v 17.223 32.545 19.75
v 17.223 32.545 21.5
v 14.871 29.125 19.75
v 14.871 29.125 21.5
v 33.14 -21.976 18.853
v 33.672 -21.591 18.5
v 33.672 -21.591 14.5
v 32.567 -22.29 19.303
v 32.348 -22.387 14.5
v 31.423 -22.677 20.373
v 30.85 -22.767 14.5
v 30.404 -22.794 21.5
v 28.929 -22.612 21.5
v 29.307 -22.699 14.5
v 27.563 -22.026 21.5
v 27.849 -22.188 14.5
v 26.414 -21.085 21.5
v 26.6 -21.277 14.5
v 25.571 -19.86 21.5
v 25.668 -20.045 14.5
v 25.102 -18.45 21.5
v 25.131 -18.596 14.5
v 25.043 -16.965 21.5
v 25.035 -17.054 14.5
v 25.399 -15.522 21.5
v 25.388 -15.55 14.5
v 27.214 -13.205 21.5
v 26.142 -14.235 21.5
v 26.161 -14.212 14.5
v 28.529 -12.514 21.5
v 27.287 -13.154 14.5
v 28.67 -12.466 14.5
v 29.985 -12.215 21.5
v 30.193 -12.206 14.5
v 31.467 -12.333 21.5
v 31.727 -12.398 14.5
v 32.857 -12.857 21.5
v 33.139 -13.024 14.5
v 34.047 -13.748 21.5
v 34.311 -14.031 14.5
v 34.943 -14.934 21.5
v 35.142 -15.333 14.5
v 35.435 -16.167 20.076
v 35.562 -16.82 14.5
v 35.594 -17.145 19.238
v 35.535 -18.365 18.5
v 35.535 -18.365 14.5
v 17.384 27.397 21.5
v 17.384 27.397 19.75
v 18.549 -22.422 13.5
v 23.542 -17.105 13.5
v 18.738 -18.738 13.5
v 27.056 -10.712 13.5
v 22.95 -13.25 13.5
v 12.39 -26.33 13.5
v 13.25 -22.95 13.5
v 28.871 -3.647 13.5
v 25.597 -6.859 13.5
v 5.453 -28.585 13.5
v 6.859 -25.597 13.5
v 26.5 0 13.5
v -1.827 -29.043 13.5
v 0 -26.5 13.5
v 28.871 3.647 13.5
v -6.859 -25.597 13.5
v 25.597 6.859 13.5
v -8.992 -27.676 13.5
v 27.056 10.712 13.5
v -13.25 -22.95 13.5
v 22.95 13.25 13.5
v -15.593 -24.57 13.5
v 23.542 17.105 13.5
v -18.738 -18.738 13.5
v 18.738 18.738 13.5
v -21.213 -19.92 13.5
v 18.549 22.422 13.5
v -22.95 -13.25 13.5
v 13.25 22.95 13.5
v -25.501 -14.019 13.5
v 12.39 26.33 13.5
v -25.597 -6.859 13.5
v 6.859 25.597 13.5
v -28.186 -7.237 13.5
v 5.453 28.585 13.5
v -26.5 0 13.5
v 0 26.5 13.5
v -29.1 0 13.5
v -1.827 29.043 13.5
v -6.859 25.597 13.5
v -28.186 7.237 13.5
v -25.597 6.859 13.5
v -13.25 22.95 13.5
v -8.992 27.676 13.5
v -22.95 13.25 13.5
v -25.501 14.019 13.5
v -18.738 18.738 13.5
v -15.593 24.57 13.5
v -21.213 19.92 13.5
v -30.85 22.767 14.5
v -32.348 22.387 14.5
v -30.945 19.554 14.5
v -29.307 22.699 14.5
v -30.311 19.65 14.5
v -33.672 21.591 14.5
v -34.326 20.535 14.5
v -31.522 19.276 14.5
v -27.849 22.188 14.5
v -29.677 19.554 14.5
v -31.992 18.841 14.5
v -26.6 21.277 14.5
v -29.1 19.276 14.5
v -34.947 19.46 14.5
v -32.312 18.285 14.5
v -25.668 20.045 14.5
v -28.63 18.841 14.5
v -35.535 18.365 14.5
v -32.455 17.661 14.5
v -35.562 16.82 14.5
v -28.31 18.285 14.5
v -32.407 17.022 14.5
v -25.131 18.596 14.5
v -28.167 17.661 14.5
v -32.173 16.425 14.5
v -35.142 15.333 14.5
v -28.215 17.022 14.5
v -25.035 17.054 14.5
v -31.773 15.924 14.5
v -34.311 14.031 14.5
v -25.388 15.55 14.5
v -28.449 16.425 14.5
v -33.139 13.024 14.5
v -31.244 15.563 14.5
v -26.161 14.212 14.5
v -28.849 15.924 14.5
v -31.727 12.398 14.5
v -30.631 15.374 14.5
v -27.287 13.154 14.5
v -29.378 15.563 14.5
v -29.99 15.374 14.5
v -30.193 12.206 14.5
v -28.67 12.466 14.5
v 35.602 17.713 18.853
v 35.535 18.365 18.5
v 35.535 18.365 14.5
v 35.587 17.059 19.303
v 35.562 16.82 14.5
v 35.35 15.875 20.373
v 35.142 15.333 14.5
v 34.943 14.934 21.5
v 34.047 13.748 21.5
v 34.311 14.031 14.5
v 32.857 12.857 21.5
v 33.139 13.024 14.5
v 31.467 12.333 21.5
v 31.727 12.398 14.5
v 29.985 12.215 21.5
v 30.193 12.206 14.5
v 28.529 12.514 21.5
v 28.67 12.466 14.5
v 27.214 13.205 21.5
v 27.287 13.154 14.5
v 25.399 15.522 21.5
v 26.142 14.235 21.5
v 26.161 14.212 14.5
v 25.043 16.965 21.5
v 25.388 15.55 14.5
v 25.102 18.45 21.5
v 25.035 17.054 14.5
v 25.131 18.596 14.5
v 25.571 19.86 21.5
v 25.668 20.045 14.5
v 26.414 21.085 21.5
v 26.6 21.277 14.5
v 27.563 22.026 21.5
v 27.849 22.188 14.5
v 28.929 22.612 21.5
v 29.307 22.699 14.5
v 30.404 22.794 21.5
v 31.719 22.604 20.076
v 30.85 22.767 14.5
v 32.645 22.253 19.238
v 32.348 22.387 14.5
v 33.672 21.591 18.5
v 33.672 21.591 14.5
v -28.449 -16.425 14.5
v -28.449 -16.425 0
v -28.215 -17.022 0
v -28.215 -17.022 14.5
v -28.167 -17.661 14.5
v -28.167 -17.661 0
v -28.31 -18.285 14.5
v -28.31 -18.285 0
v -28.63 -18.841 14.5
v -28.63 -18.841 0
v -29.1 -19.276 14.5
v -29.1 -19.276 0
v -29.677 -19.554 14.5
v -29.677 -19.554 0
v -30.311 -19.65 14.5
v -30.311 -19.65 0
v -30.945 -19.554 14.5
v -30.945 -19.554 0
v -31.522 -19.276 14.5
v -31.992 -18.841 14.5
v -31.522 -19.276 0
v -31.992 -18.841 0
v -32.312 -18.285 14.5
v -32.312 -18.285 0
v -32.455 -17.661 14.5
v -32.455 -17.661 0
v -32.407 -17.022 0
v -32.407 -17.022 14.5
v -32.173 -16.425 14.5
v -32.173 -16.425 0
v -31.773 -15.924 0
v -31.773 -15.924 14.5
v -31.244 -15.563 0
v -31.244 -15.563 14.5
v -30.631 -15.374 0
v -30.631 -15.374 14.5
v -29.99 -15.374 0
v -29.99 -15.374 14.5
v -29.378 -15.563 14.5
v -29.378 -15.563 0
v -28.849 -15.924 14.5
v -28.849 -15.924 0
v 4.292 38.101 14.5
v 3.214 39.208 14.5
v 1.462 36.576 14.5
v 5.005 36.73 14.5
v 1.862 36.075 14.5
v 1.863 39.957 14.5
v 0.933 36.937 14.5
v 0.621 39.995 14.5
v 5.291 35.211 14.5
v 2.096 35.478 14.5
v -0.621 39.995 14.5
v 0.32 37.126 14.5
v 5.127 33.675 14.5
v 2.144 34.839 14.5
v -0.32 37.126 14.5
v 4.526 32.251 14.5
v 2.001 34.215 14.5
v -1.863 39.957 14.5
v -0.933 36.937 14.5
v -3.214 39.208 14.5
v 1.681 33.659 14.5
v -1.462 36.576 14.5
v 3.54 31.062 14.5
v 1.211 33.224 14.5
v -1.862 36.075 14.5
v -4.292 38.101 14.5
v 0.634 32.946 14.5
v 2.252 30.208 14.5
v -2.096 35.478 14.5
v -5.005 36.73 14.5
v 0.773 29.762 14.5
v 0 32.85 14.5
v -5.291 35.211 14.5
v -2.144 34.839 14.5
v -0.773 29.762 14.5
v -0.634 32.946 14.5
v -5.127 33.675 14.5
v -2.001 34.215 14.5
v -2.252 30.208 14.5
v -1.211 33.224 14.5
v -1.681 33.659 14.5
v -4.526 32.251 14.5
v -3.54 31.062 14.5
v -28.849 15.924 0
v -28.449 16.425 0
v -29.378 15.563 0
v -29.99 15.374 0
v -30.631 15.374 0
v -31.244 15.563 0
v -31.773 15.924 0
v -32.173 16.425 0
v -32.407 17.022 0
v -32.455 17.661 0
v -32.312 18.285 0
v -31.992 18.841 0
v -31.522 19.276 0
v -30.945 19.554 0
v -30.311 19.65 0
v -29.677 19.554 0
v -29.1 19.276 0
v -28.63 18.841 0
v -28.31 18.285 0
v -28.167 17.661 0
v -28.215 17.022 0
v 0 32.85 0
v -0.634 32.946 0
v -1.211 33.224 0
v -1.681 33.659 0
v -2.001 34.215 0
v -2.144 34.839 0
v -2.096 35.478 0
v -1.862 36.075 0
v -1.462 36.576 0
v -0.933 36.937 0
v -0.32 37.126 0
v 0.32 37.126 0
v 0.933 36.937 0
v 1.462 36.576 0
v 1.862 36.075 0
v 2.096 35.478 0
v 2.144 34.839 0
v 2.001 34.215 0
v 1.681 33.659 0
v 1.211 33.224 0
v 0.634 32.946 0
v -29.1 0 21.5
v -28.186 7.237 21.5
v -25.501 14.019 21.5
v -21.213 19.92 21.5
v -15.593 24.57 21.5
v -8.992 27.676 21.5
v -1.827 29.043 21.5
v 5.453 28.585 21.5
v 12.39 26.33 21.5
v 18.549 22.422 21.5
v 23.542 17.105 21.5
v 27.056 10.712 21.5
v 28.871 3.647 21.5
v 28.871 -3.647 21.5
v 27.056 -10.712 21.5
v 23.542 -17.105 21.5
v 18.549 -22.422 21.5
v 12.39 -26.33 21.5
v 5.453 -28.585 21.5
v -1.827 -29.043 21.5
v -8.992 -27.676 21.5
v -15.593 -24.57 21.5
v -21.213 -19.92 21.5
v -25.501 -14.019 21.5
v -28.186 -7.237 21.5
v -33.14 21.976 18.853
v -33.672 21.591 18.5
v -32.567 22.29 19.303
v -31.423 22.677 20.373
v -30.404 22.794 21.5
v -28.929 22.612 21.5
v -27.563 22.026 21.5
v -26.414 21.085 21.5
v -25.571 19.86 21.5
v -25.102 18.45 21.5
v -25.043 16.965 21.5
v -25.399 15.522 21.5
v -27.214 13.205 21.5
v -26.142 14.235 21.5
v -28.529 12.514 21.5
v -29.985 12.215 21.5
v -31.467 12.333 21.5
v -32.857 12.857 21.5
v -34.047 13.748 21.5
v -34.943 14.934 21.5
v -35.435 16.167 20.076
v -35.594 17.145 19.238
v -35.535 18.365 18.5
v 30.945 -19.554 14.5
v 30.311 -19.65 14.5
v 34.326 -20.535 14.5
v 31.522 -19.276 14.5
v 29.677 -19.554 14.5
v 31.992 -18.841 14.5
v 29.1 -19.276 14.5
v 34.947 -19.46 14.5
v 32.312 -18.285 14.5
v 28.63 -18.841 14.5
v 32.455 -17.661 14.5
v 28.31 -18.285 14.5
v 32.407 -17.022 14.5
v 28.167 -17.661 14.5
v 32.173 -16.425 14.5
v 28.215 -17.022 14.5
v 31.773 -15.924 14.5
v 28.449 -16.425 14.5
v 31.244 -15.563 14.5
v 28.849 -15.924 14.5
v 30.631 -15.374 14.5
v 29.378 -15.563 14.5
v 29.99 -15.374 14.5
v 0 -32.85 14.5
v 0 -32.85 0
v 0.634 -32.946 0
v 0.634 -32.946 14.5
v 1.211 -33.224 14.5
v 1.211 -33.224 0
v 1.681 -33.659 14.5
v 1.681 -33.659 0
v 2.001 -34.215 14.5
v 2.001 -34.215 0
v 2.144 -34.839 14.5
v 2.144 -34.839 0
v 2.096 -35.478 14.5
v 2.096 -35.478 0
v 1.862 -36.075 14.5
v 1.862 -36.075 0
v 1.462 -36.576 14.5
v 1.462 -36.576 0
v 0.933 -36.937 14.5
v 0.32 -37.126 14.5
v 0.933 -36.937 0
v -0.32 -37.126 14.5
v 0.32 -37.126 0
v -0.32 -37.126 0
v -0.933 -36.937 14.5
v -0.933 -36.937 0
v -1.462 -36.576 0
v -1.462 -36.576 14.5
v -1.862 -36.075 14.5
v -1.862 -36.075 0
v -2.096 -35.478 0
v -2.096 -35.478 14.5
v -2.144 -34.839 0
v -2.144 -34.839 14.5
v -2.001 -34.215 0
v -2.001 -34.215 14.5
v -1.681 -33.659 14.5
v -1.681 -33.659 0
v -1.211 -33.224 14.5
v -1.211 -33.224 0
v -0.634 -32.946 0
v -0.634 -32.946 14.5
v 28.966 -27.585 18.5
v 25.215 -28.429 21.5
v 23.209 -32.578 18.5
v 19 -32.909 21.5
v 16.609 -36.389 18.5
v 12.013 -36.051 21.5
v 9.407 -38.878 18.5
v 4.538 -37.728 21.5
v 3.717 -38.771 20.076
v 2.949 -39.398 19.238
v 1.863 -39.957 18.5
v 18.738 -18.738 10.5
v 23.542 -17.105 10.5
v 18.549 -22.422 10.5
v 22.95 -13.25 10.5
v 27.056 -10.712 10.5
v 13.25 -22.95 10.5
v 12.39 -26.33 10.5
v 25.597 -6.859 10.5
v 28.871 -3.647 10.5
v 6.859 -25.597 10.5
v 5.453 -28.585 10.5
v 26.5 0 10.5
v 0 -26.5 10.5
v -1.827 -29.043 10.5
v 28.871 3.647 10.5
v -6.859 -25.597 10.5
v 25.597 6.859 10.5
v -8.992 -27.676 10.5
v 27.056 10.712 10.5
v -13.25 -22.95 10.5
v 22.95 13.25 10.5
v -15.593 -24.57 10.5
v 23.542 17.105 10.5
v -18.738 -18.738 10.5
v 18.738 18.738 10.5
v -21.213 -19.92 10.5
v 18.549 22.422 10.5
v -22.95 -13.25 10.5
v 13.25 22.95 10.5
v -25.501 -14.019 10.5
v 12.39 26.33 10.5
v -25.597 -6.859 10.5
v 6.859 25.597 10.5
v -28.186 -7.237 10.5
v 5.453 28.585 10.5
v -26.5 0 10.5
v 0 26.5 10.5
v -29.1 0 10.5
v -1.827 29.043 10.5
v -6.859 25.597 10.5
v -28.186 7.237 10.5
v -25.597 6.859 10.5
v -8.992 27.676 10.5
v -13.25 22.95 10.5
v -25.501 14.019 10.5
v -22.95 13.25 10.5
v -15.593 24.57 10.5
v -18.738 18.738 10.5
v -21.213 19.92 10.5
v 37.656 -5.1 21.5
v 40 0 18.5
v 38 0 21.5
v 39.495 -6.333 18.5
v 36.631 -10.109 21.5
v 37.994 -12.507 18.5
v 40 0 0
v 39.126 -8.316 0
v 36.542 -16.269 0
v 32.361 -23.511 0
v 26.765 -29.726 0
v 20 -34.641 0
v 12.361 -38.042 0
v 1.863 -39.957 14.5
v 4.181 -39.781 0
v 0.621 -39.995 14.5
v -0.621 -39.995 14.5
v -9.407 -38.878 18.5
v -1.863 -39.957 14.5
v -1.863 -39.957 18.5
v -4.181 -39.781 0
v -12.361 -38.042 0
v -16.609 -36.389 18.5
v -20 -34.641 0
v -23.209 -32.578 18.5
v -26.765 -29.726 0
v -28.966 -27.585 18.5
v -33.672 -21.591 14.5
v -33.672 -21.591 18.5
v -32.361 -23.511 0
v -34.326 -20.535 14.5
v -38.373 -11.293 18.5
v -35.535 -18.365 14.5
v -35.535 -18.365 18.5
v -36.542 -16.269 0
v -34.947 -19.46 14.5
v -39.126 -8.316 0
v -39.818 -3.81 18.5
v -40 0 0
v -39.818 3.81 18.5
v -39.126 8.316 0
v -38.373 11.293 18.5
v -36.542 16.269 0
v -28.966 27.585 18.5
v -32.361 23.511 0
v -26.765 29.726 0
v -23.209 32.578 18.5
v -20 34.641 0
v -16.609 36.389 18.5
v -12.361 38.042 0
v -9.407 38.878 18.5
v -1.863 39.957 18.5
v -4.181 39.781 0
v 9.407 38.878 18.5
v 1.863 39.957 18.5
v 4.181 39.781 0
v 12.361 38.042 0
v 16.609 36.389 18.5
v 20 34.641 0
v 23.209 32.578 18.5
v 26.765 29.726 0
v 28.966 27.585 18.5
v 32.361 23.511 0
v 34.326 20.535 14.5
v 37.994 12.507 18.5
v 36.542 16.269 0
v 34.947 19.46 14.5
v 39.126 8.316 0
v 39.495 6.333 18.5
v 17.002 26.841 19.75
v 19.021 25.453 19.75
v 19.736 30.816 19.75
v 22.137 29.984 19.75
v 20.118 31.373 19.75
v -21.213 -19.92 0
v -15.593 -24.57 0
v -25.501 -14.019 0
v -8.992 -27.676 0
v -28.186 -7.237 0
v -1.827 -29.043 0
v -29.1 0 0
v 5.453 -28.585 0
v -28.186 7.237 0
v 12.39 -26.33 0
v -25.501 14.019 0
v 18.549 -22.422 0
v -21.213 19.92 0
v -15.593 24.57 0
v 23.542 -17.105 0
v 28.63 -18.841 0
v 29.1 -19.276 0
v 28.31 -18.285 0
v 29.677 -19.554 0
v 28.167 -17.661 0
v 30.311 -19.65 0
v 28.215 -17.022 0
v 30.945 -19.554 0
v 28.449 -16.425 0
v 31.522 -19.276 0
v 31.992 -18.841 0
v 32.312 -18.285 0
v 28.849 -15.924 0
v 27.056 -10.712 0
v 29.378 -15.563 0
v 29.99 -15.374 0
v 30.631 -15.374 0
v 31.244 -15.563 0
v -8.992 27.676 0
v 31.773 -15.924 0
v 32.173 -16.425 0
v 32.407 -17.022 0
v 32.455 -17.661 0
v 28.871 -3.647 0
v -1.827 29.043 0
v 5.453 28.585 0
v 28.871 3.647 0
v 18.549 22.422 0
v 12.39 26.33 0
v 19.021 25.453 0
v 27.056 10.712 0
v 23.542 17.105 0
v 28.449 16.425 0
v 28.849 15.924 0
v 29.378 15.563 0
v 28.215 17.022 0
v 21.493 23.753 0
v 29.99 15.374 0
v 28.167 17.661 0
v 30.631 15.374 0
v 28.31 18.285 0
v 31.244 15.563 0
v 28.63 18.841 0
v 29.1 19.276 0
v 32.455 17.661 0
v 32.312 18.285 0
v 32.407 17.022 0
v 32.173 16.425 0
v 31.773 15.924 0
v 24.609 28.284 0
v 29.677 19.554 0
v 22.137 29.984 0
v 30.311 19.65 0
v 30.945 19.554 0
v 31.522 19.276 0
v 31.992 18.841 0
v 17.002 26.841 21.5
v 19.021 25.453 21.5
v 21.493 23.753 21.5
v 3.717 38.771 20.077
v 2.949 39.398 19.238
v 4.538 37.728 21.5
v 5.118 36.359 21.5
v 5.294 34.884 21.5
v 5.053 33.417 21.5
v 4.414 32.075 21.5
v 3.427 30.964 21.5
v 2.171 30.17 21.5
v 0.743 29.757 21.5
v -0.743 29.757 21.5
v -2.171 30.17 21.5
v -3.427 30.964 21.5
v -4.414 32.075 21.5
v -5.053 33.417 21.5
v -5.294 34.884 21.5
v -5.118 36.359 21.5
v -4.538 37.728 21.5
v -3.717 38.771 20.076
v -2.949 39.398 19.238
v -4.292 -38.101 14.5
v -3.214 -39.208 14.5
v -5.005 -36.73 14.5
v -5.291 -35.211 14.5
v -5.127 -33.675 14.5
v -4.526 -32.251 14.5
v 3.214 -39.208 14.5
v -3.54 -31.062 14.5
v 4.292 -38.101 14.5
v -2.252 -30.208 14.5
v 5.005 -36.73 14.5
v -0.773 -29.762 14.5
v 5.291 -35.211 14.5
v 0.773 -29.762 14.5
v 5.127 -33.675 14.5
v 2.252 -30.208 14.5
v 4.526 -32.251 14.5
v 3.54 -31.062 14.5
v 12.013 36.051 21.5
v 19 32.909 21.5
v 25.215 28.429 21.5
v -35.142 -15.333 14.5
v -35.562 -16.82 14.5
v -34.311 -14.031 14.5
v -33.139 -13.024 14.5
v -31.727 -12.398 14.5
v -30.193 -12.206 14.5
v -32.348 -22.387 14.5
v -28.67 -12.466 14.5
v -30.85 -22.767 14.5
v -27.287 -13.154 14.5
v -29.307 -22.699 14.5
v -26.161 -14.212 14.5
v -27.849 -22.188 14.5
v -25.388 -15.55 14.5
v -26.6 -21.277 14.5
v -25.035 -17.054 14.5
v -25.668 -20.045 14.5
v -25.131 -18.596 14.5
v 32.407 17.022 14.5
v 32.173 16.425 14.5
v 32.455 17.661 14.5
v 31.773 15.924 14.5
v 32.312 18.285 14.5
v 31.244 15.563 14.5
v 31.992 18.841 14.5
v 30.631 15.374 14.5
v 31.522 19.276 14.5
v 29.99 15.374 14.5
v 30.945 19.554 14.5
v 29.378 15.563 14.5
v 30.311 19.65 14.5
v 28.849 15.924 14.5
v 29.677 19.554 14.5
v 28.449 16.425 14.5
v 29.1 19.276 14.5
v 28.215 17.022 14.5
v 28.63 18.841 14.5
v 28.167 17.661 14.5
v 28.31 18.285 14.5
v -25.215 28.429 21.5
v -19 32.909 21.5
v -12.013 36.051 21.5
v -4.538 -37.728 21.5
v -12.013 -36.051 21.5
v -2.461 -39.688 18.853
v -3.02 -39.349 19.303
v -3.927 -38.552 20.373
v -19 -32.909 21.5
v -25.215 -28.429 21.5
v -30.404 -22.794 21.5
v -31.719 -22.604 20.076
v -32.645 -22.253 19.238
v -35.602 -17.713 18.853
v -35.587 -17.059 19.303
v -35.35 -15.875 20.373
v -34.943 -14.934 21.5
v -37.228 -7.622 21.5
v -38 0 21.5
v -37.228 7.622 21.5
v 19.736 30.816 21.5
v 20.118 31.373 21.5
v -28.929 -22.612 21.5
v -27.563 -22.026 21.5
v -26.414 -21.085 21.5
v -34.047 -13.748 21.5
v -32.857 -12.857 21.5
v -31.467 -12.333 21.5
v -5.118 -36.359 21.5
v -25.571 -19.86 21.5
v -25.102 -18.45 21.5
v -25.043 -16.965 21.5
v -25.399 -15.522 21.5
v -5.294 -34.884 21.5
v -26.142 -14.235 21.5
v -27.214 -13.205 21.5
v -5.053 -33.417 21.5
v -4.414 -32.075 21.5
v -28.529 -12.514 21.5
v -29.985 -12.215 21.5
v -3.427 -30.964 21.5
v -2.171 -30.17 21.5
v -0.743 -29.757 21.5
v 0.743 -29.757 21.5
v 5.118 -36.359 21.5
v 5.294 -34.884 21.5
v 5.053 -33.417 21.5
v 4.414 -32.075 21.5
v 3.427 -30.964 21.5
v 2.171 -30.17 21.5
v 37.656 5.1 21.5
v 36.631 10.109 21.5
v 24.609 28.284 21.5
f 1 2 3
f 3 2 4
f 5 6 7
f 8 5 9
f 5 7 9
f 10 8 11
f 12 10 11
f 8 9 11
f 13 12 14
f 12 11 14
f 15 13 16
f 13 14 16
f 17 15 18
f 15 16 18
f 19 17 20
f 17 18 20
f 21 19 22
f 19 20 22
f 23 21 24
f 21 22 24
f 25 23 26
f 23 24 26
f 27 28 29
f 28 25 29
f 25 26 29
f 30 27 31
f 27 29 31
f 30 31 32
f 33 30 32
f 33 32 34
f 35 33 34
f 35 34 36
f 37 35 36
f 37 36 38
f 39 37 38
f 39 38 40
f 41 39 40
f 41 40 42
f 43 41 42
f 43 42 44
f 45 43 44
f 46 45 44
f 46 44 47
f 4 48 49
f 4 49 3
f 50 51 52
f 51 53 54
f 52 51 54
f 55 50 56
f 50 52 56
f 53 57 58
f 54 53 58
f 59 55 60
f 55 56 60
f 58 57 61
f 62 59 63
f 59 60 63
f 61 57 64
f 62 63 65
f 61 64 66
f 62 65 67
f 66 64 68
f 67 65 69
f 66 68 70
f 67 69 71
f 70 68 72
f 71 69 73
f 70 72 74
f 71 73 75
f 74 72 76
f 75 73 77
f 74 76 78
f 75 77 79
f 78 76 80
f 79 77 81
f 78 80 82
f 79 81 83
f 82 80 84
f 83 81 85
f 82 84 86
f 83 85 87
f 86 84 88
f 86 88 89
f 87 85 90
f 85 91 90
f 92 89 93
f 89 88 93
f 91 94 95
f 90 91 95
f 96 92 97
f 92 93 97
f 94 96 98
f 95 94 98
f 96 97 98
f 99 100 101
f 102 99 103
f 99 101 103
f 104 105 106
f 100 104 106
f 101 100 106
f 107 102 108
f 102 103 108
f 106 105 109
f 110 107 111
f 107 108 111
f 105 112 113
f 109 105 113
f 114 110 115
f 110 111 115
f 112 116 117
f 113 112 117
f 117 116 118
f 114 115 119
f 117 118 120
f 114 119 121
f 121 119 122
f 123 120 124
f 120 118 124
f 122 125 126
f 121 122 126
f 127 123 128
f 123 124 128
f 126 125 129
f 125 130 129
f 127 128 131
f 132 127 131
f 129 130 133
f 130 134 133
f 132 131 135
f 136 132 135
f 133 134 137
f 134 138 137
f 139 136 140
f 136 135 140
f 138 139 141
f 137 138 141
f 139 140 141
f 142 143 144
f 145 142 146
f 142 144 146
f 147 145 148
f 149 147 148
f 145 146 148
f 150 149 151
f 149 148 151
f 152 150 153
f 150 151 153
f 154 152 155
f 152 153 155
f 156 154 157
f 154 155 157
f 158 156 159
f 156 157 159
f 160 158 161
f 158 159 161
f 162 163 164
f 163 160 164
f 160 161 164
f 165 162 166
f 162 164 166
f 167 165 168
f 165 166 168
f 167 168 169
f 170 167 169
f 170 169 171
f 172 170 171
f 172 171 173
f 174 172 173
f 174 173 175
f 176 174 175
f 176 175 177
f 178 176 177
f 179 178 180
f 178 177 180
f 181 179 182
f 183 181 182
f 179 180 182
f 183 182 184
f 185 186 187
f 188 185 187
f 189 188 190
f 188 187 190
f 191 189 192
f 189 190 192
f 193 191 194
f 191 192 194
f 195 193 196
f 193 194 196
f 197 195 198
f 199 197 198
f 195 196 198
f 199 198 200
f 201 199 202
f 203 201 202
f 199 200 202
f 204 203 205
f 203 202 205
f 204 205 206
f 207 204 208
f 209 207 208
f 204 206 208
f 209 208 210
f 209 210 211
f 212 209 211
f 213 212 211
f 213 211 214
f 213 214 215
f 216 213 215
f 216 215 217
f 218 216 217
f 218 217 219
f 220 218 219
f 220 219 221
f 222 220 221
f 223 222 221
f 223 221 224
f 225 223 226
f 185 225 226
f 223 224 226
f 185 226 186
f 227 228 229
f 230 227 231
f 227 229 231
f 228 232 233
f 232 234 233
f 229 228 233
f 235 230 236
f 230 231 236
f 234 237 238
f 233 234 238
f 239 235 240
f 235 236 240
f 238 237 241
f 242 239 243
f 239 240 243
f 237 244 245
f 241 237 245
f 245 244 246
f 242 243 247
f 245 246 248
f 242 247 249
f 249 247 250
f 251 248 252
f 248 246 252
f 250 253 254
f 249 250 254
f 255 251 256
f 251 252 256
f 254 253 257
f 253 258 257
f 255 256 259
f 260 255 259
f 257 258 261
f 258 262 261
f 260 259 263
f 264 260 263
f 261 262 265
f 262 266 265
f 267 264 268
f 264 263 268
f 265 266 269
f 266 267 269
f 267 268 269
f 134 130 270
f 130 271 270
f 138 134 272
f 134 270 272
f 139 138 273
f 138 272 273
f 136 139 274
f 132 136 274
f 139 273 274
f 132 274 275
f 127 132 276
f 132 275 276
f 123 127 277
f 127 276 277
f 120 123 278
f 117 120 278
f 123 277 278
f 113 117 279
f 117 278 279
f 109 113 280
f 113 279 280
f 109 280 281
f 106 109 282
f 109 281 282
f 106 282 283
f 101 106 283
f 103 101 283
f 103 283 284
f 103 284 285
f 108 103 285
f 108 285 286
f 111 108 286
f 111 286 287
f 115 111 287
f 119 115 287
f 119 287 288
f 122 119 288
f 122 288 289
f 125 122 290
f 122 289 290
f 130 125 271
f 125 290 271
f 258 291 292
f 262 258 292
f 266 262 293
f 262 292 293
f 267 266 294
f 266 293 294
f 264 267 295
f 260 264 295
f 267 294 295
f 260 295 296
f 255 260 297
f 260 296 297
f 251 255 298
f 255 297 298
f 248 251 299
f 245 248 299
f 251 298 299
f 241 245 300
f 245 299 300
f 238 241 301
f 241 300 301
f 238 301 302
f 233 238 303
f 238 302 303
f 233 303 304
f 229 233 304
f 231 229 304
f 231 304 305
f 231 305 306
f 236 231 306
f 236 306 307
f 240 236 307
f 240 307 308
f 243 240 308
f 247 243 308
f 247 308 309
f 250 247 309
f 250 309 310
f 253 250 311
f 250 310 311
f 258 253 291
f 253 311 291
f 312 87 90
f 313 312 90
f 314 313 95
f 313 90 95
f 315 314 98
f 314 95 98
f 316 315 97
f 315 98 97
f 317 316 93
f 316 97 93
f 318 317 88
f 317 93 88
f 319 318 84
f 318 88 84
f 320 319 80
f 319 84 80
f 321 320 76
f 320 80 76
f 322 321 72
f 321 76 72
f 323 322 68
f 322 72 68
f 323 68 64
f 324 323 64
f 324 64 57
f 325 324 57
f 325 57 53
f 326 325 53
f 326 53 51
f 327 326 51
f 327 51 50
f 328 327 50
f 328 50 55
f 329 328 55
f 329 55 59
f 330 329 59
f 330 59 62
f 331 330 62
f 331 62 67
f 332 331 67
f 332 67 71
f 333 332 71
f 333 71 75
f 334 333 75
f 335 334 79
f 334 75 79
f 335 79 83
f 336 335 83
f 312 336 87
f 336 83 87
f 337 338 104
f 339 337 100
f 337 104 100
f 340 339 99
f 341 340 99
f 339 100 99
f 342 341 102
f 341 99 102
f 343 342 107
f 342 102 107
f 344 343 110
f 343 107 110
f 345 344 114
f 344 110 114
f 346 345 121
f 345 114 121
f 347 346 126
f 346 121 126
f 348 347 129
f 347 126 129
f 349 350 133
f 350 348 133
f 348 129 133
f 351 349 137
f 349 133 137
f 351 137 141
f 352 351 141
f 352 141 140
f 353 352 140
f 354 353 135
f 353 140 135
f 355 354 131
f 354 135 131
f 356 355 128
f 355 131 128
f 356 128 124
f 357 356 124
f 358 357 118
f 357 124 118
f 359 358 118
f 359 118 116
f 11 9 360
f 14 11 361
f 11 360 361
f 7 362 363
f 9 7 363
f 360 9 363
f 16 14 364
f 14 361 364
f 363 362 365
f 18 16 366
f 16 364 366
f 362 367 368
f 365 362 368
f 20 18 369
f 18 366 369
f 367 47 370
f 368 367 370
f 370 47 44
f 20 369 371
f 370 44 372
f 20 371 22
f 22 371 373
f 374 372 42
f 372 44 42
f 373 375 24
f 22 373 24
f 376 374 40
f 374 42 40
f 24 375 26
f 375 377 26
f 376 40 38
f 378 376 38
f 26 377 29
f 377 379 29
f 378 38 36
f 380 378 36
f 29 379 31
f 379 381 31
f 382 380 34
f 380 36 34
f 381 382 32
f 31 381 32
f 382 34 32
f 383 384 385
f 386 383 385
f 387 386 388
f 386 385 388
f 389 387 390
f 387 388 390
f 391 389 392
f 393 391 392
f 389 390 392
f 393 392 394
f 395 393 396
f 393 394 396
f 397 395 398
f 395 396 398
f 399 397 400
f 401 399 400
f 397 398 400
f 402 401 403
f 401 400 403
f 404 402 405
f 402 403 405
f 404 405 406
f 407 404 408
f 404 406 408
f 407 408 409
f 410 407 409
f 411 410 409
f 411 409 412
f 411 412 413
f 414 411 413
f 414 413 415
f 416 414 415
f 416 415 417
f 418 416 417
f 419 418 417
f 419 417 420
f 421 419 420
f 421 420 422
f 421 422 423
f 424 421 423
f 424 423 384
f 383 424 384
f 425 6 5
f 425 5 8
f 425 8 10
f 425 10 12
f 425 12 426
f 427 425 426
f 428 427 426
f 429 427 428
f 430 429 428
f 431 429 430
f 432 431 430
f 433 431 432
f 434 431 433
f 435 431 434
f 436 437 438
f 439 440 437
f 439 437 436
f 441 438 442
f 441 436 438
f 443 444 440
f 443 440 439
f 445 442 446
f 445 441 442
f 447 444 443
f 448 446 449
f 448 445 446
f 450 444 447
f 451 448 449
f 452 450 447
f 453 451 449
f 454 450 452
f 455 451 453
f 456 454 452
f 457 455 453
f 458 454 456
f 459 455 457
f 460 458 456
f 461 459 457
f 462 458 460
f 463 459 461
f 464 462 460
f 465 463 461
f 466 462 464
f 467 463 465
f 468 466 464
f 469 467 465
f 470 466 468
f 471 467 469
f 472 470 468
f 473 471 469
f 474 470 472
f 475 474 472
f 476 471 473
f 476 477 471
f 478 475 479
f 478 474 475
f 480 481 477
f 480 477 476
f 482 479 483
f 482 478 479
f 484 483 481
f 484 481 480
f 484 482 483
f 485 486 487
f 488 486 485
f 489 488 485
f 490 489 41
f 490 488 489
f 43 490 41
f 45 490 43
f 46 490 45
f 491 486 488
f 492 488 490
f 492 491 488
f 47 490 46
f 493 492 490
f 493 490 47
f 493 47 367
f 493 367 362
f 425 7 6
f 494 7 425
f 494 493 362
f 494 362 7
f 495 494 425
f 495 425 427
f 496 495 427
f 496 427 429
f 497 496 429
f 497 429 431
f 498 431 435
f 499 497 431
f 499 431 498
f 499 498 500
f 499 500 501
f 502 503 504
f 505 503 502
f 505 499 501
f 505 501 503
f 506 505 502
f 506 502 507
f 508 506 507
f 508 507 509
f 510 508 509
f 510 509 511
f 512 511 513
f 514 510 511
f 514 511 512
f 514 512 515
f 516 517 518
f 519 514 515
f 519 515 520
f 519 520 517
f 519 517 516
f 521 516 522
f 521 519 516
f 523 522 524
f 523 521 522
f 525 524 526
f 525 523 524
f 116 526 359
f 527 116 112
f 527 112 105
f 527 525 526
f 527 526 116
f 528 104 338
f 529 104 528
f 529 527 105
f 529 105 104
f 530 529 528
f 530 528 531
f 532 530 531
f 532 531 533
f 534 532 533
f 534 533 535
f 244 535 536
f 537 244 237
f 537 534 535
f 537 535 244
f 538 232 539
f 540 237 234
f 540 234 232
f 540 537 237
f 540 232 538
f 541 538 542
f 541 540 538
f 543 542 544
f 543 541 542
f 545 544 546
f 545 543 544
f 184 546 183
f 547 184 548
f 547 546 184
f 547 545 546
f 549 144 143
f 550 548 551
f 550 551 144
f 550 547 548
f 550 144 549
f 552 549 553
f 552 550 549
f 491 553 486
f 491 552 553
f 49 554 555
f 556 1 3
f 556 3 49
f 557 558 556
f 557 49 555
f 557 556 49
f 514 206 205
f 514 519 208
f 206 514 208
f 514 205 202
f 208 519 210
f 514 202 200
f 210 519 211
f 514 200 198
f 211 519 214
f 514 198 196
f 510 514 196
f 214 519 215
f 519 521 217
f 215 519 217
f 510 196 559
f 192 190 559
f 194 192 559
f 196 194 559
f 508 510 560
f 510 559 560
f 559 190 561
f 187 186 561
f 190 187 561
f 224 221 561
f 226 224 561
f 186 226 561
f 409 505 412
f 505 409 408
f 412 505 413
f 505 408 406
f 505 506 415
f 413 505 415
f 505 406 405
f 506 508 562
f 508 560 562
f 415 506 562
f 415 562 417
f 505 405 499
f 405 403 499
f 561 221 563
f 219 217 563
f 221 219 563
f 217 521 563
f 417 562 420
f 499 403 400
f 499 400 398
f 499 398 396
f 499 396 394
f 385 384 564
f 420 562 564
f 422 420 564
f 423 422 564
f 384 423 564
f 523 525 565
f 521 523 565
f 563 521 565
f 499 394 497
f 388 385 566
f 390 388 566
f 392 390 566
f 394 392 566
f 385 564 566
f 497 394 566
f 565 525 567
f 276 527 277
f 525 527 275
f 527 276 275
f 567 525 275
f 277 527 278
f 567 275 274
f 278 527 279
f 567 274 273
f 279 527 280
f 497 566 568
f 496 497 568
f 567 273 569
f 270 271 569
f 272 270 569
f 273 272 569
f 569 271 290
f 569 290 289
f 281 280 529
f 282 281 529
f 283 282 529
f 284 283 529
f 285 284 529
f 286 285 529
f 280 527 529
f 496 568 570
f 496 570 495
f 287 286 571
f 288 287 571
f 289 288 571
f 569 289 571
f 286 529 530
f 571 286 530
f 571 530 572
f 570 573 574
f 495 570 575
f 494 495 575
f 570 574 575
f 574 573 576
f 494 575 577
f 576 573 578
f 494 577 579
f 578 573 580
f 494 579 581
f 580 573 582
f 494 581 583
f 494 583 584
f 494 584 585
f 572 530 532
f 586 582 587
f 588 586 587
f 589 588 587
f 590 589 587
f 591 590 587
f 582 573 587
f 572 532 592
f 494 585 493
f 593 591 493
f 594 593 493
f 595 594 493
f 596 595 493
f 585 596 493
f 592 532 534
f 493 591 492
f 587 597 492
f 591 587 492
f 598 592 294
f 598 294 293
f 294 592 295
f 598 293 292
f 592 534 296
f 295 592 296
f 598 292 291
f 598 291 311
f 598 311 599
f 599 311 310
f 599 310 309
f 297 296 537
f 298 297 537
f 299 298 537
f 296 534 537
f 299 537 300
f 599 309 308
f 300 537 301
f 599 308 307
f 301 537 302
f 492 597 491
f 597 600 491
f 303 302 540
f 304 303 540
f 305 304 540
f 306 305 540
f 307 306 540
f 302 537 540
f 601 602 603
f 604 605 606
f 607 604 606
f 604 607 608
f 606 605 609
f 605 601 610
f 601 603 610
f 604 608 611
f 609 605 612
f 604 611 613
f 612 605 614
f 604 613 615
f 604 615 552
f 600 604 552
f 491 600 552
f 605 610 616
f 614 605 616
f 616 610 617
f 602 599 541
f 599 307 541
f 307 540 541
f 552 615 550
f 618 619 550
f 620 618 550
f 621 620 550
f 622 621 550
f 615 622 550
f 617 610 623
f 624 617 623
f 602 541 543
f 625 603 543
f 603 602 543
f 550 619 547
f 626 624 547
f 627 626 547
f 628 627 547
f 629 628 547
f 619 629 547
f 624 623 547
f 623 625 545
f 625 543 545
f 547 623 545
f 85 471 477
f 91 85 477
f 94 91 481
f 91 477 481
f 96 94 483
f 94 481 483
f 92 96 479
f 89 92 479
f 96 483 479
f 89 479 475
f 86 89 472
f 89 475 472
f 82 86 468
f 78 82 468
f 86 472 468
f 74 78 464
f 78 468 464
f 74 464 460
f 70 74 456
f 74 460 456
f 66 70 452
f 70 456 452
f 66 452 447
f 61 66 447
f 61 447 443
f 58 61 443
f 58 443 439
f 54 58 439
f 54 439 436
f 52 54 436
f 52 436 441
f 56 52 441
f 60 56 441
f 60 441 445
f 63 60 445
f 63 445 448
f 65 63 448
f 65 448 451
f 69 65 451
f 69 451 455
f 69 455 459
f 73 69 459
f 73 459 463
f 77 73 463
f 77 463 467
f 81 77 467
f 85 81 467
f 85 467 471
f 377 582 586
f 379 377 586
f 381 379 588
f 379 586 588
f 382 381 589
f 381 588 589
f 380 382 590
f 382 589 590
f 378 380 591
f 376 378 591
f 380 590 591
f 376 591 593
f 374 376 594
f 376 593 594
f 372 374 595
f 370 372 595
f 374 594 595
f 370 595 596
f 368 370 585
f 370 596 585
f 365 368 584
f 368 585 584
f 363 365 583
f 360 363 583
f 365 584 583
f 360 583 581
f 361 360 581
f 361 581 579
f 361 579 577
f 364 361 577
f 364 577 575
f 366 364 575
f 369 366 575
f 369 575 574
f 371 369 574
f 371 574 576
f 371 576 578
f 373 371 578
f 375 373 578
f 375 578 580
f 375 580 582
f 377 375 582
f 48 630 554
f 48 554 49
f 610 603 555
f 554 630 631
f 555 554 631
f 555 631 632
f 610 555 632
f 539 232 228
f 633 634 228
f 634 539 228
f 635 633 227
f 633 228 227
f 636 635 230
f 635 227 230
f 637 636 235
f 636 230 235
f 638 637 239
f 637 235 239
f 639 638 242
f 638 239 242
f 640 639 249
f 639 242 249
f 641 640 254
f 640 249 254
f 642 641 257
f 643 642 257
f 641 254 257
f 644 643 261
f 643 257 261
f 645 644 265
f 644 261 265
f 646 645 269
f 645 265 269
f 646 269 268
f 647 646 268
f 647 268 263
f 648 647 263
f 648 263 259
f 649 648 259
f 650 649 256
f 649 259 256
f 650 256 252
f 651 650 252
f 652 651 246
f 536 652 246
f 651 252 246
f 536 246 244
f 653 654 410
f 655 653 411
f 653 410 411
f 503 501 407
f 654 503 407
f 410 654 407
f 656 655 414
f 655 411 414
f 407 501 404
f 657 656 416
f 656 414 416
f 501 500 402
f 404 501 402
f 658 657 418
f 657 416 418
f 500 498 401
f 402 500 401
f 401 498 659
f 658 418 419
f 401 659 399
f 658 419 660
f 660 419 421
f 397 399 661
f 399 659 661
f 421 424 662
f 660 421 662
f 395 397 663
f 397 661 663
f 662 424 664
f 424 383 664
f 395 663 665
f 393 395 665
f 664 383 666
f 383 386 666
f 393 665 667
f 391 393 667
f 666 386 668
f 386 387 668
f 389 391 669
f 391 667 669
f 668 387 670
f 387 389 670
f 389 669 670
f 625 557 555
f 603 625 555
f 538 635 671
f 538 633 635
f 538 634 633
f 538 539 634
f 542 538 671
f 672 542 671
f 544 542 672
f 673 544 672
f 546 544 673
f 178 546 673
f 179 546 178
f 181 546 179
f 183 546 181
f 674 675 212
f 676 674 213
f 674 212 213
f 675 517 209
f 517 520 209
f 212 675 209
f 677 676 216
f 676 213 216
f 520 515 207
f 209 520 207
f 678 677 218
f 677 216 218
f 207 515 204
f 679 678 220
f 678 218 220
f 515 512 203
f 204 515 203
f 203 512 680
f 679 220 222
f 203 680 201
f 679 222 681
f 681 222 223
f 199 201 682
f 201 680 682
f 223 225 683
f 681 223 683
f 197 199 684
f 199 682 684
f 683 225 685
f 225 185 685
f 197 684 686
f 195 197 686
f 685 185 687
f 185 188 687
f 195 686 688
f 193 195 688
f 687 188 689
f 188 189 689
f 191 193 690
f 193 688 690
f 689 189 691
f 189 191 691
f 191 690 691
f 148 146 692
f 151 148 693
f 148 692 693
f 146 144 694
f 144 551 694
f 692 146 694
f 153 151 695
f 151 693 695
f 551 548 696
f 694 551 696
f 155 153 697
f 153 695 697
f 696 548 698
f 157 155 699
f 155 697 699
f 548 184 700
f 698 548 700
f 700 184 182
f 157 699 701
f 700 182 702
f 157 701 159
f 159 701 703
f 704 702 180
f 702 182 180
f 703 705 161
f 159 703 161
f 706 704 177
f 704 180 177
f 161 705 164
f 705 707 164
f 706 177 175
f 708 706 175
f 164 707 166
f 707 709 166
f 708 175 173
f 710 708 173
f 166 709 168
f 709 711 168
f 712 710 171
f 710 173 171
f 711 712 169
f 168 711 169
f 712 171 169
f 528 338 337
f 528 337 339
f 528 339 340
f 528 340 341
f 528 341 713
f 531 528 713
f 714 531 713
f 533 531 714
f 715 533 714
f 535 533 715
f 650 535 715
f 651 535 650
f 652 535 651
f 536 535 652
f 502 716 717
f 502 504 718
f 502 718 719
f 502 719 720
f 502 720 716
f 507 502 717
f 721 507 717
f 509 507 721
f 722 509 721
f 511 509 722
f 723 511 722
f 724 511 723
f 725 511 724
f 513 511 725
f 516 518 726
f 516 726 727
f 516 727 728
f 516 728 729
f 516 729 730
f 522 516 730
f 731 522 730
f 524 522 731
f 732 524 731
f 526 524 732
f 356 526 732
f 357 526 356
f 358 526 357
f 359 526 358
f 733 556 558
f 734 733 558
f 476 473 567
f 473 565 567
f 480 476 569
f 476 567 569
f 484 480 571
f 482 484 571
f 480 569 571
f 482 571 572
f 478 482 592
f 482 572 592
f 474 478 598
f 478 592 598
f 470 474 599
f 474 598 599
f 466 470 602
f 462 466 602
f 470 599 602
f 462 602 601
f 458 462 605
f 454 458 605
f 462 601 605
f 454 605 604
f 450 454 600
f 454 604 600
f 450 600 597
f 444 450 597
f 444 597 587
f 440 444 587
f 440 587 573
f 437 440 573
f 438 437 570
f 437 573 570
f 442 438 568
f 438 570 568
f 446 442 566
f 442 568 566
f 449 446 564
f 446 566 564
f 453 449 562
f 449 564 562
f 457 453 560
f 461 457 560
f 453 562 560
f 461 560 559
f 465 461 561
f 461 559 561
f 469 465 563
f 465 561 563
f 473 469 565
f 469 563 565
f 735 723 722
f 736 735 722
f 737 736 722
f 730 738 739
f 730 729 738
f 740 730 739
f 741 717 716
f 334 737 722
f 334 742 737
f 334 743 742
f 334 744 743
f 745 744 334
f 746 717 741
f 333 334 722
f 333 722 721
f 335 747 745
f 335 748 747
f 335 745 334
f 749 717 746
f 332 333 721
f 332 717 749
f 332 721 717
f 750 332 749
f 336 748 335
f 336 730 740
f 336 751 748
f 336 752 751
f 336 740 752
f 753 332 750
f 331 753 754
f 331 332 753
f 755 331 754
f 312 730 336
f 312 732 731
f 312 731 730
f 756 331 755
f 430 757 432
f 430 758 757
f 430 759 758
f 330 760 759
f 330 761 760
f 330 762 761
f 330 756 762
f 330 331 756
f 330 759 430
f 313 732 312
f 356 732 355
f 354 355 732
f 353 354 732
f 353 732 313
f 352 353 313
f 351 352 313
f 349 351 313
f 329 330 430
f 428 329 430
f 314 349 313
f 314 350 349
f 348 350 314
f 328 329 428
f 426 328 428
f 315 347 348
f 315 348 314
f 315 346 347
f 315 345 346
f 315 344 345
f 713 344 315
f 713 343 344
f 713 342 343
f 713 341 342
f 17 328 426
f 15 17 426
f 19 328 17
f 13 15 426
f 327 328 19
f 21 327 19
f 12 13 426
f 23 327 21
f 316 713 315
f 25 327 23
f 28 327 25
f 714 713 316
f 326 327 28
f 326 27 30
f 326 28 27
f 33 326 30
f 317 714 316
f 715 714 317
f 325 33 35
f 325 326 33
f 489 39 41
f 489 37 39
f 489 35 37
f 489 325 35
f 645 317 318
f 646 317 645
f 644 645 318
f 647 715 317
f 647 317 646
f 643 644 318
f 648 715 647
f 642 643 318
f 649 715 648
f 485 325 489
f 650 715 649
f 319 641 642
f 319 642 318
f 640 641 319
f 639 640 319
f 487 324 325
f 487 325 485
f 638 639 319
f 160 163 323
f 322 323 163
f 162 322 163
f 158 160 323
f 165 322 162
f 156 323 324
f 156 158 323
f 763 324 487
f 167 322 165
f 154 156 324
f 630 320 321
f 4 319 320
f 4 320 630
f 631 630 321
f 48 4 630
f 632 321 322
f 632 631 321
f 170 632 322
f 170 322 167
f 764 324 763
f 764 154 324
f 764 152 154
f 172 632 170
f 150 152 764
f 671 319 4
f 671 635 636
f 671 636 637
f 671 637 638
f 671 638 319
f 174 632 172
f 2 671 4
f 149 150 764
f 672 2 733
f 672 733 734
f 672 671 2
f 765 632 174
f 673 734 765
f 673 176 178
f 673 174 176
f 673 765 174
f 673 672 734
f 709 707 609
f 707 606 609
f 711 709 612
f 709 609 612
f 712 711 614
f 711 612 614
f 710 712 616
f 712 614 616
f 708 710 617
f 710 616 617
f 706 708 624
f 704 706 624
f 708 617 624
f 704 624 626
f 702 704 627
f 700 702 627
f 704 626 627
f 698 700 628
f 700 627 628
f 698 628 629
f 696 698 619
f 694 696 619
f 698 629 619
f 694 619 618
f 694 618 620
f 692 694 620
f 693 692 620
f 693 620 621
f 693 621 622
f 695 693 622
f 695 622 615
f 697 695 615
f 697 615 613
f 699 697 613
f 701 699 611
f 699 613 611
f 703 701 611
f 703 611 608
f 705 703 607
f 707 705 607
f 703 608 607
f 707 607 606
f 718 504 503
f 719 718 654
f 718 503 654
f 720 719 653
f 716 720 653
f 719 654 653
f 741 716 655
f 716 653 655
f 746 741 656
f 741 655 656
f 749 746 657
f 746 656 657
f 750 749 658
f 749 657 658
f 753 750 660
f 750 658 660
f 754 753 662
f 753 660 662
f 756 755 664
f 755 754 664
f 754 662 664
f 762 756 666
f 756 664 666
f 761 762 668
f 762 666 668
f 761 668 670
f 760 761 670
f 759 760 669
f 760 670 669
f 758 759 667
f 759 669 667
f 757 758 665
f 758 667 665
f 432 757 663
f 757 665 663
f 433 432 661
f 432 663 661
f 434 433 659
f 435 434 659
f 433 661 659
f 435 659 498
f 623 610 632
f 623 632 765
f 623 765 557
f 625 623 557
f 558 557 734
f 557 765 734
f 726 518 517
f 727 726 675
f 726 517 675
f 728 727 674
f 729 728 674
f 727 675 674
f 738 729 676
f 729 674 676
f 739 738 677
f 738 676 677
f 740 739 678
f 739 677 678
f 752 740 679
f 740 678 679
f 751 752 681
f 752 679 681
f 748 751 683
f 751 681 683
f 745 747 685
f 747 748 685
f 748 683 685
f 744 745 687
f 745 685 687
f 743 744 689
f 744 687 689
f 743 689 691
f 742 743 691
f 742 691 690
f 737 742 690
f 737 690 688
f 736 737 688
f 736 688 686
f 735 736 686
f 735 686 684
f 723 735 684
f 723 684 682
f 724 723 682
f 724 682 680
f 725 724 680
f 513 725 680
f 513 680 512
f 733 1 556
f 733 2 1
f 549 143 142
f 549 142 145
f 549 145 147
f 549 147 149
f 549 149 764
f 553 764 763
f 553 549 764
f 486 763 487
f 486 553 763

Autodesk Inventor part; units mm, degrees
ref_plane "YZ Plane" through (0, 0, 0) normal (1, 0, 0) x (0, 1, 0)
ref_plane "XZ Plane" through (0, 0, 0) normal (0, 1, 0) x (-1, 0, 0)
ref_plane "XY Plane" through (0, 0, 0) normal (0, 0, 1) x (1, 0, 0)
sketch "Sketch1" plane through (0, 0, 0) normal (0, 0, 1) x (1, 0, 0)
  circle A0 centre (0, 0) radius 40
  dimension "d0" = 80
extrude "Extrusion1" add sketch "Sketch1" along normal blind 21.5
sketch "Sketch2" plane through (0, 0, 21.5) normal (0, 0, 1) x (1, 0, 0)
  point P0 (0, 0)
  point P1 (0, 35)
  dimension "d3" = 35
hole "Hole1" at (0, 35, 21.5) direction (0, 0, -1) diameter 4.3 end through all counterbore diameter 10.59 counterbore depth 7 clearance for "Hex Head Machine Screw" size "M4" standard "Ansi Metric M Profile"
chamfer "Chamfer1" distance 2 distance2 3 2 edges at (-27.6179, -28.9353, 21.5) (28.9353, 27.6179, 21.5) measured on face at (-2.7418, -16.4668, 21.5)
pattern_circular "Circular Pattern1" count 6 over 360 about axis through (0, 0, 0) along (0, 0, 1) of "Hole1"
sketch "Sketch3" plane through (0, 0, 0) normal (0, 0, -1) x (-1, 0, 0)
  circle A0 centre (0, 0) radius 29.1
  dimension "d17" = 58.2
extrude "Extrusion2" cut sketch "Sketch3" against normal through all
ref_plane "Work Plane1" through (0, 0, 10.5) normal (0, 0, -1) x (-1, 0, 0)
sketch "Sketch4" plane through (0, 0, 10.5) normal (0, 0, -1) x (-1, 0, 0)
  circle A0 centre (0, 0) radius 29.5
  circle A1 centre (0, 0) radius 26.5
  dimension "d21" = 53
  dimension "d22" = 59
extrude "Extrusion3" add sketch "Sketch4" against normal blind 3
sketch "Sketch5" plane through (0, 0, 21.5) normal (0, 0, 1) x (1, 0, 0)
  arc A0 (33.6722, 21.5913) -> (1.8625, 39.9566) centre (0, 0) ccw projected
  line L0 (0, 0) -> (40, 0) construction
  line L1 (21.4926, 23.7527) -> (24.6091, 28.2845)
  line L2 (24.6091, 28.2845) -> (17.6054, 33.101)
  line L3 (17.6054, 33.101) -> (14.4889, 28.5691)
  line L4 (14.4889, 28.5691) -> (21.4926, 23.7527)
  line L5 (21.4926, 23.7527) -> (17.6054, 33.101) construction
  line L6 (24.6091, 28.2845) -> (14.4889, 28.5691) construction
  line L7 (17.002, 26.8409) -> (20.1185, 31.3727)
  line L8 (22.1372, 29.9845) -> (19.0207, 25.4526)
  line L9 (14.8714, 29.1253) -> (17.223, 32.5448)
  line L10 (17.223, 32.5448) -> (19.736, 30.8165)
  line L11 (19.736, 30.8165) -> (17.3845, 27.3971)
  line L12 (17.3845, 27.3971) -> (14.8714, 29.1253)
  line L13 (19.549, 28.4268) -> (16.0472, 30.8351)
  line L14 (17.3845, 27.3971) -> (17.223, 32.5448)
  line L15 (14.8714, 29.1253) -> (19.736, 30.8165)
  line L16 (0, 0) -> (17.3037, 29.9709)
  line L17 (0, 0) -> (19.549, 28.4268)
  dimension "d26" = 8.5
  dimension "d27" = 5.5
  dimension "d29" = 34.5
  dimension "d30" = 3.05
  dimension "d36" = 3
  dimension "d41" = 4.15
  dimension "d42" = 60
extrude "Extrusion4" cut sketch "Sketch5" against normal blind 1.75 contours L4 L17 L13 L7 L2 L8 | L4 L7 L13 L17 | L15 L14 L10 | L7 L13 L15 | L14 L13 L7 | L12 L16 L14 | L14 L13 L3 | L15 L3 L13 | L16 L12 L15
extrude "Extrusion7" cut sketch "Sketch5" against normal through all contours L4 L8 L2 L1
properties part number "Ring_Cover_Top"
